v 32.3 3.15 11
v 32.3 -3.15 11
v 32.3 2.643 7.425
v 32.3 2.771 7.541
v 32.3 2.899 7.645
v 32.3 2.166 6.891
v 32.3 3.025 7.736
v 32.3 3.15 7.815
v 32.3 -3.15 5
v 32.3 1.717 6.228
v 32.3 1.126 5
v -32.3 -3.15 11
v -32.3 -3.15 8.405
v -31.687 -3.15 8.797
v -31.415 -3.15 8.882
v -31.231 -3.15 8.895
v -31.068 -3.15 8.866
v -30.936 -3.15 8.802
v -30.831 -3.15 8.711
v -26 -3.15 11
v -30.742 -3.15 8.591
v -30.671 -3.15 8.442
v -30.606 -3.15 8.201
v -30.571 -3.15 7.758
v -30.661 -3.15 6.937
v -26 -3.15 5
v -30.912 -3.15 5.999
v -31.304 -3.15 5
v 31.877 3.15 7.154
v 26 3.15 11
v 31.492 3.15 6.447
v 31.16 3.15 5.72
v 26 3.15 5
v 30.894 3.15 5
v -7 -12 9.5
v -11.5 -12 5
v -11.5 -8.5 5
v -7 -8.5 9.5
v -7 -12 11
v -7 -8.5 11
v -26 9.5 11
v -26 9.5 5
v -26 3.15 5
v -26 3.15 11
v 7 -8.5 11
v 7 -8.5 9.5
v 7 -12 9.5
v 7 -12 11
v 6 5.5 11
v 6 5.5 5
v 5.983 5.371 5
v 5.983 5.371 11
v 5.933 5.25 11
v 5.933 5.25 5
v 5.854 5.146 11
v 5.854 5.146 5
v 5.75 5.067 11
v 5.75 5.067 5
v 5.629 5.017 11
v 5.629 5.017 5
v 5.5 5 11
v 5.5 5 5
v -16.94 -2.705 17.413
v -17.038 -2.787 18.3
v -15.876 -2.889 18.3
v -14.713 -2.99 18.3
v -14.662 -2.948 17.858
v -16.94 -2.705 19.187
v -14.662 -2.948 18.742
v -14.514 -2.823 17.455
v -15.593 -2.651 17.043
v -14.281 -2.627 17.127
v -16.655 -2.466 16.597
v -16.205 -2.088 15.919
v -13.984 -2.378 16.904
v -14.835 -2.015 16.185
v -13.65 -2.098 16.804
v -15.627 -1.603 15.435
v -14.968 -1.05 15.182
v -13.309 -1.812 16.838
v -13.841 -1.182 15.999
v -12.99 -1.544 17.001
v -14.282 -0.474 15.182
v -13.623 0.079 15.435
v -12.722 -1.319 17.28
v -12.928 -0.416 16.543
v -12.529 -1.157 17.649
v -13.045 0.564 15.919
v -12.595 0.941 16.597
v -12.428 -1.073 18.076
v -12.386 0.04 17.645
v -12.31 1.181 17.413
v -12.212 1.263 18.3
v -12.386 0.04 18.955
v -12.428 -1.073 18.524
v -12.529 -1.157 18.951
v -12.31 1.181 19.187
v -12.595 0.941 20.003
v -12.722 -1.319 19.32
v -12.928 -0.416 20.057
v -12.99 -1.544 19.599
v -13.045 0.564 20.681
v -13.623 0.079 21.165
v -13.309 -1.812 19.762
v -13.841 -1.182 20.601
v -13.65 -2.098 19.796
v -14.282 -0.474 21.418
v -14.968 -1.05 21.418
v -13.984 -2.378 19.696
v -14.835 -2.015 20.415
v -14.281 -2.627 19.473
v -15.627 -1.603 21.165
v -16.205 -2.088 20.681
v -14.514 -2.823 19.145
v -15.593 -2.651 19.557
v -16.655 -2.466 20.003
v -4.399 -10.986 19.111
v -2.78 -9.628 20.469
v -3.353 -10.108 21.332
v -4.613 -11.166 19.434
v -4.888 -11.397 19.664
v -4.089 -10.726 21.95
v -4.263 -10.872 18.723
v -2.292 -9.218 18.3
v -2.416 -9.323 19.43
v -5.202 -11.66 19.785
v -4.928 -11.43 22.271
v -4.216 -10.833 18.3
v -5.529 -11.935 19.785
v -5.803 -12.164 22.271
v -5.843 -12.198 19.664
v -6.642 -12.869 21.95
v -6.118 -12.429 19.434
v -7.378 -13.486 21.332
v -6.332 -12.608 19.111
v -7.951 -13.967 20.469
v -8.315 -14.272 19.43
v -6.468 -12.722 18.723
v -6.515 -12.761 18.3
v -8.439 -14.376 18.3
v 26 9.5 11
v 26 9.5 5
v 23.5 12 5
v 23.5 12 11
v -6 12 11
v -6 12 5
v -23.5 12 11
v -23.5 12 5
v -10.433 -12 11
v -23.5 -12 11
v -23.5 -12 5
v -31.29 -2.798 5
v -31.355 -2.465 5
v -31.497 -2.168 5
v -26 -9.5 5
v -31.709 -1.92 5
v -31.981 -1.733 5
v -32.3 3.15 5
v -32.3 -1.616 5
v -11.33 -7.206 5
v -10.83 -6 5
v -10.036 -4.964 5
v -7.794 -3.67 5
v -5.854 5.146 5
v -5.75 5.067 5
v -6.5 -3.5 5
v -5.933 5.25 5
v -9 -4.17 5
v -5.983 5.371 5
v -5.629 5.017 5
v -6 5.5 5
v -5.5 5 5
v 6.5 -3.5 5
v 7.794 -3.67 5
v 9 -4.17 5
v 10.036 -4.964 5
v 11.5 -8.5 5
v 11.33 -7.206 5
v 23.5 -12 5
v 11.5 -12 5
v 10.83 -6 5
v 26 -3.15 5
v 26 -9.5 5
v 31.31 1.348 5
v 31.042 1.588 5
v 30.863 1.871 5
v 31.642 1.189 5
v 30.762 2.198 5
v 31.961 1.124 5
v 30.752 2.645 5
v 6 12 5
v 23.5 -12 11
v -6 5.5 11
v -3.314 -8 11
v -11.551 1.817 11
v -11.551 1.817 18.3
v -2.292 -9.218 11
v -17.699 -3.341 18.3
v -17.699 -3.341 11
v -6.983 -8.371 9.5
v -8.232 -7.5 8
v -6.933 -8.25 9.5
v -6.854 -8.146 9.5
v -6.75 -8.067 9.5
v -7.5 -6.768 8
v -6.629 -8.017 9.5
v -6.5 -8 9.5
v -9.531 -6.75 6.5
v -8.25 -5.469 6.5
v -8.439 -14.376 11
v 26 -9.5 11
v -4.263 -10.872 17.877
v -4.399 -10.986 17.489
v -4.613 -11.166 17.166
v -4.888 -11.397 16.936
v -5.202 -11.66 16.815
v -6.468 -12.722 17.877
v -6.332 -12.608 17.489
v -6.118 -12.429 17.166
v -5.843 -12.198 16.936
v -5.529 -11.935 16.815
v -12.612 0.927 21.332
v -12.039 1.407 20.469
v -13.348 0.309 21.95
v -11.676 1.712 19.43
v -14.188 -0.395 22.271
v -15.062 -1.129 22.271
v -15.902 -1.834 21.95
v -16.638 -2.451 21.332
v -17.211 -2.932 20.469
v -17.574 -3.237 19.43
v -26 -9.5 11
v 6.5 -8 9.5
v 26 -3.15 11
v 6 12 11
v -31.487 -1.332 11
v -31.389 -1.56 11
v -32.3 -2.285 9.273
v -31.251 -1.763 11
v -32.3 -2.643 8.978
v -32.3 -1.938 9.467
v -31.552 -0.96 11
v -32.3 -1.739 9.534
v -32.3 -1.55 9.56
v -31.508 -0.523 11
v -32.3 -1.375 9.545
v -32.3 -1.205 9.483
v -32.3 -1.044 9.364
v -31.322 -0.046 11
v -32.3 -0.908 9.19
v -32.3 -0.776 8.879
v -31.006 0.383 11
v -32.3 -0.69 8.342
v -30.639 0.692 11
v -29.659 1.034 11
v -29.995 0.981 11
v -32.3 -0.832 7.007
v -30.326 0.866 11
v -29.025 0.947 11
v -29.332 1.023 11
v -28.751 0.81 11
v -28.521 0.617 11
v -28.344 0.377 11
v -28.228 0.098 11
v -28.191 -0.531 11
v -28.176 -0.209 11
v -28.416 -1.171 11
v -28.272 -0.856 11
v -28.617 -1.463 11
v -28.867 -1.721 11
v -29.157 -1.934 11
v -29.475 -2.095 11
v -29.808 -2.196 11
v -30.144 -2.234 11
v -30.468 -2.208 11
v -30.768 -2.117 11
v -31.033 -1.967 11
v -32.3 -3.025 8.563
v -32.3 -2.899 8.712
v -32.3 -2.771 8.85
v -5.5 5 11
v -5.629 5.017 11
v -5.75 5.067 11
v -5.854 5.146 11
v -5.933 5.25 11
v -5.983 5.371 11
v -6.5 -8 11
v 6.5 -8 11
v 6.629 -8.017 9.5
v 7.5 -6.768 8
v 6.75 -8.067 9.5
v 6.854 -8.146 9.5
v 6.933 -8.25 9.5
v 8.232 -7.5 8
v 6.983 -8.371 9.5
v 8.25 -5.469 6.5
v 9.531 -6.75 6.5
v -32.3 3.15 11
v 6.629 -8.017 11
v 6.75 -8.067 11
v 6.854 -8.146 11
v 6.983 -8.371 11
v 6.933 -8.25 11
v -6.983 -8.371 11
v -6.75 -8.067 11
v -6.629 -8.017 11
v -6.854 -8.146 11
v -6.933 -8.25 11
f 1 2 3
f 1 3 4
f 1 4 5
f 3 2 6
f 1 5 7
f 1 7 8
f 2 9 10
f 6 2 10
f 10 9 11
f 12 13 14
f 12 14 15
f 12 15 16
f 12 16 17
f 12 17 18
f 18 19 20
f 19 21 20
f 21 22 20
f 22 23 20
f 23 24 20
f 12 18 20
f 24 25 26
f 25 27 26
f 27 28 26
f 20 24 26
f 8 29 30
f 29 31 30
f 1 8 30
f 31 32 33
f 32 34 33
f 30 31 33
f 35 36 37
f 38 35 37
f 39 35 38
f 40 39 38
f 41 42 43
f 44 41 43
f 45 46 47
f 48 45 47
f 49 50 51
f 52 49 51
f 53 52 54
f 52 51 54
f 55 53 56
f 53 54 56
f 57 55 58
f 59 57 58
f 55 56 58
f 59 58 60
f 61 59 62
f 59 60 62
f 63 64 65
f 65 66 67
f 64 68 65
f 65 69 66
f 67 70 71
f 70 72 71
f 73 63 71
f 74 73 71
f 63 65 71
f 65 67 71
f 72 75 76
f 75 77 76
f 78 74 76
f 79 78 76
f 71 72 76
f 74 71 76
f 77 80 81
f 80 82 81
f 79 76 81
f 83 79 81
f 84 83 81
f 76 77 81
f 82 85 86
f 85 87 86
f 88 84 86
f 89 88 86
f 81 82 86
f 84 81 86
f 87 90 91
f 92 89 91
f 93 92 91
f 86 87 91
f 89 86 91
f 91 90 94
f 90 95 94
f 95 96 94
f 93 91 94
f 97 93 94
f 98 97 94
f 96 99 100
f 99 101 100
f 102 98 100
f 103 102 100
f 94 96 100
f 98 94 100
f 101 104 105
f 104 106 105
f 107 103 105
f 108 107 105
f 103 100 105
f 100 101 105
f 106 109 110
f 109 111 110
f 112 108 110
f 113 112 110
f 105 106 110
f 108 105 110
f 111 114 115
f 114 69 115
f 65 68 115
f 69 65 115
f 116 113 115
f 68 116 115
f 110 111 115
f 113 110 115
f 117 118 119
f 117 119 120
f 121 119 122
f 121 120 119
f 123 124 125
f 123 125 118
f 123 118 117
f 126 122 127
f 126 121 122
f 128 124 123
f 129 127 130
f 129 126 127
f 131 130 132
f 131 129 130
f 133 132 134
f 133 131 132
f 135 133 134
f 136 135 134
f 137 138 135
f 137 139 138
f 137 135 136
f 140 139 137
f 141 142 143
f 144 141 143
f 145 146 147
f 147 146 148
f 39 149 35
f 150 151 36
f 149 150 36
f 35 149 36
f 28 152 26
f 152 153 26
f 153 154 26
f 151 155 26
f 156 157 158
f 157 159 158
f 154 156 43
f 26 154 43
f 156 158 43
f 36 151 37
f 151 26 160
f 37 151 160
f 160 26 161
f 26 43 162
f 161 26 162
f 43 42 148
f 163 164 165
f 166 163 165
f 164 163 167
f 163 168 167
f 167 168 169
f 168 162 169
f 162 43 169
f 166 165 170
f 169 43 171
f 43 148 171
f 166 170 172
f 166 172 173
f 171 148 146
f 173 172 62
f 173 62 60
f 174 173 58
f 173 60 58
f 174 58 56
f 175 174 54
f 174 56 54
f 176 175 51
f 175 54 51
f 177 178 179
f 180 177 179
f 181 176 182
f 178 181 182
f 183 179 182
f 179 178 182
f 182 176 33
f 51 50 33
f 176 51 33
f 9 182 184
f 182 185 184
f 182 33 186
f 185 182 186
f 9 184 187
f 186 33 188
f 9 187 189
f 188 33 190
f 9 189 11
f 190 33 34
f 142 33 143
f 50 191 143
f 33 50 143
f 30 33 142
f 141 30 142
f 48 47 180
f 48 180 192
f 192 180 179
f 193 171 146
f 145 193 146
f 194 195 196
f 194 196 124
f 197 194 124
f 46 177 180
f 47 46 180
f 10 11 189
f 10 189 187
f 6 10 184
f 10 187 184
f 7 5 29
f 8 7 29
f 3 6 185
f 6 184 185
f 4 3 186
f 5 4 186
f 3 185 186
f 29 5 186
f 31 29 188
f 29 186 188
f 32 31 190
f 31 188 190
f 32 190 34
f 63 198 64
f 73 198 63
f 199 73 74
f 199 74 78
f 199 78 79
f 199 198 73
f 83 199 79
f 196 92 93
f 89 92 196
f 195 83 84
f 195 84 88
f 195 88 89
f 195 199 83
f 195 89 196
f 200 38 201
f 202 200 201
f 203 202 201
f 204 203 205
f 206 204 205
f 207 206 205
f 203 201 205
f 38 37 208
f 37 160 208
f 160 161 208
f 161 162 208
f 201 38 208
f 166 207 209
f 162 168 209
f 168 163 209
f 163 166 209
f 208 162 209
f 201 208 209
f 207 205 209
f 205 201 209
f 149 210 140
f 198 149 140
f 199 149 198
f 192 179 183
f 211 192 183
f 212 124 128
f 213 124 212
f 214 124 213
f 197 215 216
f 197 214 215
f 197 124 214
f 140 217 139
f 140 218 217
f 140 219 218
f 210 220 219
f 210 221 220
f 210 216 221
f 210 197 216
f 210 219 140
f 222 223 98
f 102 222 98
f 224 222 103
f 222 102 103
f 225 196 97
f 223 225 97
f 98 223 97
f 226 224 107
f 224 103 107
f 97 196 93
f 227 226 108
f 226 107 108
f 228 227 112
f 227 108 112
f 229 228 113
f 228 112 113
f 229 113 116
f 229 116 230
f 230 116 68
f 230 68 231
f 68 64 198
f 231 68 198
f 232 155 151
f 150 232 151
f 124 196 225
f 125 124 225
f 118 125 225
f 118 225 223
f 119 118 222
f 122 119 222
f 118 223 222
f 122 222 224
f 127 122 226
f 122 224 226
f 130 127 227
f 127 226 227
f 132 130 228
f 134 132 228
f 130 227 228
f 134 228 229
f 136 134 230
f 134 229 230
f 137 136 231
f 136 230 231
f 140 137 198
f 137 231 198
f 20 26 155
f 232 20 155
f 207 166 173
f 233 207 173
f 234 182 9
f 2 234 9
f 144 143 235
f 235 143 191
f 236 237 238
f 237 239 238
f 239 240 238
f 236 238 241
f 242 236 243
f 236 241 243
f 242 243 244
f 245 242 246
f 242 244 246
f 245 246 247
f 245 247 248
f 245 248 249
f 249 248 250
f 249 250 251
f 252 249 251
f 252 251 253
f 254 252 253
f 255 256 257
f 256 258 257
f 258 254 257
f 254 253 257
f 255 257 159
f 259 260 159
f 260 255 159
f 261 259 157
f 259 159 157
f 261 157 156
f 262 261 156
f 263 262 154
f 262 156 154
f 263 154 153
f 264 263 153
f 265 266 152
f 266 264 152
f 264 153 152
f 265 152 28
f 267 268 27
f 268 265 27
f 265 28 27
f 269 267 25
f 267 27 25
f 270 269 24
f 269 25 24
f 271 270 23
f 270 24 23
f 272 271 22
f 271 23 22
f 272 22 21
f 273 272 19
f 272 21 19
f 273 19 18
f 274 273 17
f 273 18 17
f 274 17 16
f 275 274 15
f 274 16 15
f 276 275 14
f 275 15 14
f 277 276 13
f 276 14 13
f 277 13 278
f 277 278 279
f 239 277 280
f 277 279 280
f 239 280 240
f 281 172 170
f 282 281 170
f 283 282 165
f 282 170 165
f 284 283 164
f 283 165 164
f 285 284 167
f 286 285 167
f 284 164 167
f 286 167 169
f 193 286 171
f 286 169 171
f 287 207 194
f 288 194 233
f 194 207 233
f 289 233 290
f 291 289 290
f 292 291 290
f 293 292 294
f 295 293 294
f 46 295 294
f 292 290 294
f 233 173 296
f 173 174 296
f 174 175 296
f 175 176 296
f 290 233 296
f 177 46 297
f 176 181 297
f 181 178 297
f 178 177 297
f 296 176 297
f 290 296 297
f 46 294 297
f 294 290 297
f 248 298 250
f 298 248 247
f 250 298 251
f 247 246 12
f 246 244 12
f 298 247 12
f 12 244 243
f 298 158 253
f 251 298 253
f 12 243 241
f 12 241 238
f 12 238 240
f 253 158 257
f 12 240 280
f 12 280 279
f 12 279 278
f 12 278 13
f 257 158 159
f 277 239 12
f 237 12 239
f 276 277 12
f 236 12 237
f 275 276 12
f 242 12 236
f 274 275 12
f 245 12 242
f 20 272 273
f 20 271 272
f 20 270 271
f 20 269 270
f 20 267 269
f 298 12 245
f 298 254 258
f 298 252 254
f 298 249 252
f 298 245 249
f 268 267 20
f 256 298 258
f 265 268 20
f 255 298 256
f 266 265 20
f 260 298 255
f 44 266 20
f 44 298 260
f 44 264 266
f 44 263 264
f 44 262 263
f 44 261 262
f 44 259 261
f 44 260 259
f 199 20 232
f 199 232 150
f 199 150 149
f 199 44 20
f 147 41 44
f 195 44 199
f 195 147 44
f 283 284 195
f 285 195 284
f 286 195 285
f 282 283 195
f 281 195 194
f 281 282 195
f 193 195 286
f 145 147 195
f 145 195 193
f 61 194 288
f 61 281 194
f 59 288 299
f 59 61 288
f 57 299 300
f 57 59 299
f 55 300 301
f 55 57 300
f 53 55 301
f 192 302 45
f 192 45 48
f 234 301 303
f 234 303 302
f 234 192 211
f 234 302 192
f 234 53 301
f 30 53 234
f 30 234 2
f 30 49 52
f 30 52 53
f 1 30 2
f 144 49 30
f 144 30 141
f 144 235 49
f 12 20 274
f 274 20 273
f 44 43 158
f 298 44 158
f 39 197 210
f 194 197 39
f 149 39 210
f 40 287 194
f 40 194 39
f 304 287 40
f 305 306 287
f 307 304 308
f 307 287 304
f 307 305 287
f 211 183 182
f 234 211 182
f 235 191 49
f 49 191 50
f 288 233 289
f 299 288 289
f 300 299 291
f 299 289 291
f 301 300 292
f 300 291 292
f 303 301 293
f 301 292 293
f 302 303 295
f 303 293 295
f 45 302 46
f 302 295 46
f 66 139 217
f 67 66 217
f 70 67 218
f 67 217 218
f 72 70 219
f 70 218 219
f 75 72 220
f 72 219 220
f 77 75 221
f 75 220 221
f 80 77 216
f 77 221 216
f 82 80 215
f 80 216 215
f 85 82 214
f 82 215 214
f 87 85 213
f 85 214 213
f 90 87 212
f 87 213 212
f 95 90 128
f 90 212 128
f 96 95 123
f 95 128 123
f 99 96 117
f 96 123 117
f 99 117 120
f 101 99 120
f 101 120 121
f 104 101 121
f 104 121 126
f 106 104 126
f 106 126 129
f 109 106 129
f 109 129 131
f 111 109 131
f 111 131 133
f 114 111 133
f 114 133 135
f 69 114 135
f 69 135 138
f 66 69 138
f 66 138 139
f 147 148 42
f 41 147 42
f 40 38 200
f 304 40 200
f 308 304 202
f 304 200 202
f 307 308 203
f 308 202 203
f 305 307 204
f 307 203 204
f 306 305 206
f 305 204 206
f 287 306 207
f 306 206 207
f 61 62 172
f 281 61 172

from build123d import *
from build123d.topology import SkipClean

# Parameters (mm, degrees)
BOSS_EXTRUDE1_START           = 5
BOSS_EXTRUDE1_DEPTH           = 6
CHAMFER1_SIZE                 = 4.5
SKETCH2_W                     = 6
SKETCH2_H                     = 6.3
BOSS_EXTRUDE2_DEPTH           = 6.3
BOSS_EXTRUDE3_DEPTH           = 7.3
BOSS_EXTRUDE4_DEPTH           = 14.405295
CSK_FOR_M3_SFHCS1_D           = 3
CSK_FOR_M3_SFHCS1_CSINK_D     = 6.3
CSK_FOR_M3_SFHCS1_CSINK_ANGLE = 90
BOSS_EXTRUDE5_DEPTH           = 14.405295
CSK_FOR_M3_SFHCS2_D           = 3
CSK_FOR_M3_SFHCS2_CSINK_D     = 6.3
CSK_FOR_M3_SFHCS2_CSINK_ANGLE = 90
SKETCH10_W                    = 19.443915682
SKETCH10_H                    = 19.443915683
CUT_EXTRUDE1_DEPTH            = 15
CSK_FOR_M3_SFHCS3_D           = 3
CSK_FOR_M3_SFHCS3_DEPTH       = 96.77876722
CSK_FOR_M3_SFHCS3_CSINK_D     = 6.3
CSK_FOR_M3_SFHCS3_CSINK_ANGLE = 90


with BuildPart() as part:
    # Sketch1 → Boss-Extrude1 (new body)
    with BuildSketch(Plane.XY.offset(BOSS_EXTRUDE1_START)):
        with BuildLine():
            Line((-23.5, -12), (-7, -12))
            Line((-7, -12), (-7, -8.5))
            ThreePointArc((-7, -8.5), (-6.853553391, -8.146446609), (-6.5, -8))
            Line((-6.5, -8), (6.5, -8))
            ThreePointArc((6.5, -8), (6.853553391, -8.146446609), (7, -8.5))
            Line((7, -8.5), (7, -12))
            Line((7, -12), (23.5, -12))
            Line((23.5, -12), (26, -9.5))
            Line((26, -9.5), (26, -3.15))
            Line((26, -3.15), (32.3, -3.15))
            Line((32.3, -3.15), (32.3, 3.15))
            Line((32.3, 3.15), (26, 3.15))
            Line((26, 3.15), (26, 9.5))
            Line((26, 9.5), (23.5, 12))
            Line((23.5, 12), (6, 12))
            Line((6, 12), (6, 5.5))
            ThreePointArc((6, 5.5), (5.853553391, 5.146446609), (5.5, 5))
            Line((5.5, 5), (-5.5, 5))
            ThreePointArc((-5.5, 5), (-5.853553391, 5.146446609), (-6, 5.5))
            Line((-6, 5.5), (-6, 12))
            Line((-6, 12), (-23.5, 12))
            Line((-23.5, 12), (-26, 9.5))
            Line((-26, 9.5), (-26, 3.15))
            Line((-26, 3.15), (-32.3, 3.15))
            Line((-32.3, 3.15), (-32.3, -3.15))
            Line((-32.3, -3.15), (-26, -3.15))
            Line((-26, -3.15), (-26, -9.5))
            Line((-26, -9.5), (-23.5, -12))
        make_face()
    extrude(amount=BOSS_EXTRUDE1_DEPTH)

    # Chamfer1
    chamfer1_edges = [part.edges().sort_by_distance(p)[0] for p in [
        (7, -10.25, 5),
        (6.853553391, -8.146446609, 5),
        (0, -8, 5),
        (-6.853553391, -8.146446609, 5),
        (-7, -10.25, 5),
    ]]
    chamfer(chamfer1_edges, length=CHAMFER1_SIZE)

    # Sketch2 → Boss-Extrude2 (add)
    with BuildSketch(Plane(origin=(26, 0, 0), x_dir=(0, 0, -1), z_dir=(1, 0, 0))):
        with Locations((-8, 0)):
            Rectangle(SKETCH2_W, SKETCH2_H)
    boss_extrude2 = extrude(amount=BOSS_EXTRUDE2_DEPTH)

    # Mirror1: Boss-Extrude2 across plane
    add(boss_extrude2.mirror(Plane(origin=(0, 0, 0), x_dir=(0, 0, 1), z_dir=(1, 0, 0))))

    # Sketch3 → Boss-Extrude3 (add)
    with BuildSketch(Plane.XY.offset(11)):
        Polygon((11.551404138, 1.816830905), (2.291859281, -9.218264944), (8.439052056, -14.376372134), (17.698596913, -3.341276285), align=None)
    boss_extrude3 = extrude(amount=BOSS_EXTRUDE3_DEPTH)

    # Sketch4 → Boss-Extrude4 (add)
    with SkipClean():  # the faces are left unmerged after this step: merging them gives an invalid solid
        with BuildSketch(Plane(origin=(5.667376511, 6.754116317, 0), x_dir=(0.7660444431189792, -0.6427876096865379, 0), z_dir=(0.6427876096865379, 0.7660444431189792, 0))):
            with BuildLine():
                Line((15.705642813, -18.3), (7.681052555, -18.3))
                ThreePointArc((7.681052555, -18.3), (11.693347684, -22.312295129), (15.705642813, -18.3))
            make_face()
        extrude(amount=-BOSS_EXTRUDE4_DEPTH)

    # CSK for M3 SFHCS1 (through all)
    with Locations(Plane(origin=(5.667376511, 6.754116317, 0), x_dir=(0.7660444431189792, -0.6427876096865379, 0), z_dir=(0.6427876096865379, 0.7660444431189792, 0))):
        with Locations((11.693347684, -18.3)):
            CounterSinkHole(CSK_FOR_M3_SFHCS1_D / 2, CSK_FOR_M3_SFHCS1_CSINK_D / 2, counter_sink_angle=CSK_FOR_M3_SFHCS1_CSINK_ANGLE)

    # Mirror11: Boss-Extrude3 across plane
    with SkipClean():  # the faces are left unmerged after this step: merging them gives an invalid solid
        add(boss_extrude3.mirror(Plane(origin=(0, 0, 0), x_dir=(0, 0, 1), z_dir=(1, 0, 0))))

    # Sketch7 → Boss-Extrude5 (add)
    with SkipClean():  # the faces are left unmerged after this step: merging them gives an invalid solid
        with BuildSketch(Plane(origin=(-5.667376511, 6.754116317, 0), x_dir=(0.7660444431189792, 0.6427876096865379, 0), z_dir=(-0.6427876096865379, 0.7660444431189792, 0))):
            with BuildLine():
                Line((-15.705642813, -18.3), (-7.681052555, -18.3))
                ThreePointArc((-7.681052555, -18.3), (-11.693347684, -22.312295129), (-15.705642813, -18.3))
            make_face()
        extrude(amount=-BOSS_EXTRUDE5_DEPTH)

    # CSK for M3 SFHCS2 (through all)
    with Locations(Plane(origin=(-5.667376511, 6.754116317, 0), x_dir=(0.7660444431189792, 0.6427876096865379, 0), z_dir=(-0.6427876096865379, 0.7660444431189792, 0))):
        with Locations((-11.693347684, -18.3)):
            CounterSinkHole(CSK_FOR_M3_SFHCS2_D / 2, CSK_FOR_M3_SFHCS2_CSINK_D / 2, counter_sink_angle=CSK_FOR_M3_SFHCS2_CSINK_ANGLE)

    # Sketch10 → Cut-Extrude1 (cut)
    with SkipClean():  # the faces are left unmerged after this step: merging them gives an invalid solid
        with BuildSketch(Plane.XY.offset(11)):
            with Locations((9.721957841, -5.898825434)):
                Rectangle(SKETCH10_W, SKETCH10_H)
        extrude(amount=CUT_EXTRUDE1_DEPTH, mode=Mode.SUBTRACT)

    # CSK for M3 SFHCS3
    with Locations(Plane(origin=(1373.834887972, -105.616816862, -567.783106147), x_dir=(0.6343091461006831, 0.5322485705454647, -0.5606811628058603), z_dir=(0.4295066891289175, 0.36039890443624706, 0.8280317830099689))):
        with Locations((-1114.335057549, 945.253960578), (-1158.995448583, 982.728478223)):
            CounterSinkHole(CSK_FOR_M3_SFHCS3_D / 2, CSK_FOR_M3_SFHCS3_CSINK_D / 2, depth=CSK_FOR_M3_SFHCS3_DEPTH, counter_sink_angle=CSK_FOR_M3_SFHCS3_CSINK_ANGLE)


solid = part.part
